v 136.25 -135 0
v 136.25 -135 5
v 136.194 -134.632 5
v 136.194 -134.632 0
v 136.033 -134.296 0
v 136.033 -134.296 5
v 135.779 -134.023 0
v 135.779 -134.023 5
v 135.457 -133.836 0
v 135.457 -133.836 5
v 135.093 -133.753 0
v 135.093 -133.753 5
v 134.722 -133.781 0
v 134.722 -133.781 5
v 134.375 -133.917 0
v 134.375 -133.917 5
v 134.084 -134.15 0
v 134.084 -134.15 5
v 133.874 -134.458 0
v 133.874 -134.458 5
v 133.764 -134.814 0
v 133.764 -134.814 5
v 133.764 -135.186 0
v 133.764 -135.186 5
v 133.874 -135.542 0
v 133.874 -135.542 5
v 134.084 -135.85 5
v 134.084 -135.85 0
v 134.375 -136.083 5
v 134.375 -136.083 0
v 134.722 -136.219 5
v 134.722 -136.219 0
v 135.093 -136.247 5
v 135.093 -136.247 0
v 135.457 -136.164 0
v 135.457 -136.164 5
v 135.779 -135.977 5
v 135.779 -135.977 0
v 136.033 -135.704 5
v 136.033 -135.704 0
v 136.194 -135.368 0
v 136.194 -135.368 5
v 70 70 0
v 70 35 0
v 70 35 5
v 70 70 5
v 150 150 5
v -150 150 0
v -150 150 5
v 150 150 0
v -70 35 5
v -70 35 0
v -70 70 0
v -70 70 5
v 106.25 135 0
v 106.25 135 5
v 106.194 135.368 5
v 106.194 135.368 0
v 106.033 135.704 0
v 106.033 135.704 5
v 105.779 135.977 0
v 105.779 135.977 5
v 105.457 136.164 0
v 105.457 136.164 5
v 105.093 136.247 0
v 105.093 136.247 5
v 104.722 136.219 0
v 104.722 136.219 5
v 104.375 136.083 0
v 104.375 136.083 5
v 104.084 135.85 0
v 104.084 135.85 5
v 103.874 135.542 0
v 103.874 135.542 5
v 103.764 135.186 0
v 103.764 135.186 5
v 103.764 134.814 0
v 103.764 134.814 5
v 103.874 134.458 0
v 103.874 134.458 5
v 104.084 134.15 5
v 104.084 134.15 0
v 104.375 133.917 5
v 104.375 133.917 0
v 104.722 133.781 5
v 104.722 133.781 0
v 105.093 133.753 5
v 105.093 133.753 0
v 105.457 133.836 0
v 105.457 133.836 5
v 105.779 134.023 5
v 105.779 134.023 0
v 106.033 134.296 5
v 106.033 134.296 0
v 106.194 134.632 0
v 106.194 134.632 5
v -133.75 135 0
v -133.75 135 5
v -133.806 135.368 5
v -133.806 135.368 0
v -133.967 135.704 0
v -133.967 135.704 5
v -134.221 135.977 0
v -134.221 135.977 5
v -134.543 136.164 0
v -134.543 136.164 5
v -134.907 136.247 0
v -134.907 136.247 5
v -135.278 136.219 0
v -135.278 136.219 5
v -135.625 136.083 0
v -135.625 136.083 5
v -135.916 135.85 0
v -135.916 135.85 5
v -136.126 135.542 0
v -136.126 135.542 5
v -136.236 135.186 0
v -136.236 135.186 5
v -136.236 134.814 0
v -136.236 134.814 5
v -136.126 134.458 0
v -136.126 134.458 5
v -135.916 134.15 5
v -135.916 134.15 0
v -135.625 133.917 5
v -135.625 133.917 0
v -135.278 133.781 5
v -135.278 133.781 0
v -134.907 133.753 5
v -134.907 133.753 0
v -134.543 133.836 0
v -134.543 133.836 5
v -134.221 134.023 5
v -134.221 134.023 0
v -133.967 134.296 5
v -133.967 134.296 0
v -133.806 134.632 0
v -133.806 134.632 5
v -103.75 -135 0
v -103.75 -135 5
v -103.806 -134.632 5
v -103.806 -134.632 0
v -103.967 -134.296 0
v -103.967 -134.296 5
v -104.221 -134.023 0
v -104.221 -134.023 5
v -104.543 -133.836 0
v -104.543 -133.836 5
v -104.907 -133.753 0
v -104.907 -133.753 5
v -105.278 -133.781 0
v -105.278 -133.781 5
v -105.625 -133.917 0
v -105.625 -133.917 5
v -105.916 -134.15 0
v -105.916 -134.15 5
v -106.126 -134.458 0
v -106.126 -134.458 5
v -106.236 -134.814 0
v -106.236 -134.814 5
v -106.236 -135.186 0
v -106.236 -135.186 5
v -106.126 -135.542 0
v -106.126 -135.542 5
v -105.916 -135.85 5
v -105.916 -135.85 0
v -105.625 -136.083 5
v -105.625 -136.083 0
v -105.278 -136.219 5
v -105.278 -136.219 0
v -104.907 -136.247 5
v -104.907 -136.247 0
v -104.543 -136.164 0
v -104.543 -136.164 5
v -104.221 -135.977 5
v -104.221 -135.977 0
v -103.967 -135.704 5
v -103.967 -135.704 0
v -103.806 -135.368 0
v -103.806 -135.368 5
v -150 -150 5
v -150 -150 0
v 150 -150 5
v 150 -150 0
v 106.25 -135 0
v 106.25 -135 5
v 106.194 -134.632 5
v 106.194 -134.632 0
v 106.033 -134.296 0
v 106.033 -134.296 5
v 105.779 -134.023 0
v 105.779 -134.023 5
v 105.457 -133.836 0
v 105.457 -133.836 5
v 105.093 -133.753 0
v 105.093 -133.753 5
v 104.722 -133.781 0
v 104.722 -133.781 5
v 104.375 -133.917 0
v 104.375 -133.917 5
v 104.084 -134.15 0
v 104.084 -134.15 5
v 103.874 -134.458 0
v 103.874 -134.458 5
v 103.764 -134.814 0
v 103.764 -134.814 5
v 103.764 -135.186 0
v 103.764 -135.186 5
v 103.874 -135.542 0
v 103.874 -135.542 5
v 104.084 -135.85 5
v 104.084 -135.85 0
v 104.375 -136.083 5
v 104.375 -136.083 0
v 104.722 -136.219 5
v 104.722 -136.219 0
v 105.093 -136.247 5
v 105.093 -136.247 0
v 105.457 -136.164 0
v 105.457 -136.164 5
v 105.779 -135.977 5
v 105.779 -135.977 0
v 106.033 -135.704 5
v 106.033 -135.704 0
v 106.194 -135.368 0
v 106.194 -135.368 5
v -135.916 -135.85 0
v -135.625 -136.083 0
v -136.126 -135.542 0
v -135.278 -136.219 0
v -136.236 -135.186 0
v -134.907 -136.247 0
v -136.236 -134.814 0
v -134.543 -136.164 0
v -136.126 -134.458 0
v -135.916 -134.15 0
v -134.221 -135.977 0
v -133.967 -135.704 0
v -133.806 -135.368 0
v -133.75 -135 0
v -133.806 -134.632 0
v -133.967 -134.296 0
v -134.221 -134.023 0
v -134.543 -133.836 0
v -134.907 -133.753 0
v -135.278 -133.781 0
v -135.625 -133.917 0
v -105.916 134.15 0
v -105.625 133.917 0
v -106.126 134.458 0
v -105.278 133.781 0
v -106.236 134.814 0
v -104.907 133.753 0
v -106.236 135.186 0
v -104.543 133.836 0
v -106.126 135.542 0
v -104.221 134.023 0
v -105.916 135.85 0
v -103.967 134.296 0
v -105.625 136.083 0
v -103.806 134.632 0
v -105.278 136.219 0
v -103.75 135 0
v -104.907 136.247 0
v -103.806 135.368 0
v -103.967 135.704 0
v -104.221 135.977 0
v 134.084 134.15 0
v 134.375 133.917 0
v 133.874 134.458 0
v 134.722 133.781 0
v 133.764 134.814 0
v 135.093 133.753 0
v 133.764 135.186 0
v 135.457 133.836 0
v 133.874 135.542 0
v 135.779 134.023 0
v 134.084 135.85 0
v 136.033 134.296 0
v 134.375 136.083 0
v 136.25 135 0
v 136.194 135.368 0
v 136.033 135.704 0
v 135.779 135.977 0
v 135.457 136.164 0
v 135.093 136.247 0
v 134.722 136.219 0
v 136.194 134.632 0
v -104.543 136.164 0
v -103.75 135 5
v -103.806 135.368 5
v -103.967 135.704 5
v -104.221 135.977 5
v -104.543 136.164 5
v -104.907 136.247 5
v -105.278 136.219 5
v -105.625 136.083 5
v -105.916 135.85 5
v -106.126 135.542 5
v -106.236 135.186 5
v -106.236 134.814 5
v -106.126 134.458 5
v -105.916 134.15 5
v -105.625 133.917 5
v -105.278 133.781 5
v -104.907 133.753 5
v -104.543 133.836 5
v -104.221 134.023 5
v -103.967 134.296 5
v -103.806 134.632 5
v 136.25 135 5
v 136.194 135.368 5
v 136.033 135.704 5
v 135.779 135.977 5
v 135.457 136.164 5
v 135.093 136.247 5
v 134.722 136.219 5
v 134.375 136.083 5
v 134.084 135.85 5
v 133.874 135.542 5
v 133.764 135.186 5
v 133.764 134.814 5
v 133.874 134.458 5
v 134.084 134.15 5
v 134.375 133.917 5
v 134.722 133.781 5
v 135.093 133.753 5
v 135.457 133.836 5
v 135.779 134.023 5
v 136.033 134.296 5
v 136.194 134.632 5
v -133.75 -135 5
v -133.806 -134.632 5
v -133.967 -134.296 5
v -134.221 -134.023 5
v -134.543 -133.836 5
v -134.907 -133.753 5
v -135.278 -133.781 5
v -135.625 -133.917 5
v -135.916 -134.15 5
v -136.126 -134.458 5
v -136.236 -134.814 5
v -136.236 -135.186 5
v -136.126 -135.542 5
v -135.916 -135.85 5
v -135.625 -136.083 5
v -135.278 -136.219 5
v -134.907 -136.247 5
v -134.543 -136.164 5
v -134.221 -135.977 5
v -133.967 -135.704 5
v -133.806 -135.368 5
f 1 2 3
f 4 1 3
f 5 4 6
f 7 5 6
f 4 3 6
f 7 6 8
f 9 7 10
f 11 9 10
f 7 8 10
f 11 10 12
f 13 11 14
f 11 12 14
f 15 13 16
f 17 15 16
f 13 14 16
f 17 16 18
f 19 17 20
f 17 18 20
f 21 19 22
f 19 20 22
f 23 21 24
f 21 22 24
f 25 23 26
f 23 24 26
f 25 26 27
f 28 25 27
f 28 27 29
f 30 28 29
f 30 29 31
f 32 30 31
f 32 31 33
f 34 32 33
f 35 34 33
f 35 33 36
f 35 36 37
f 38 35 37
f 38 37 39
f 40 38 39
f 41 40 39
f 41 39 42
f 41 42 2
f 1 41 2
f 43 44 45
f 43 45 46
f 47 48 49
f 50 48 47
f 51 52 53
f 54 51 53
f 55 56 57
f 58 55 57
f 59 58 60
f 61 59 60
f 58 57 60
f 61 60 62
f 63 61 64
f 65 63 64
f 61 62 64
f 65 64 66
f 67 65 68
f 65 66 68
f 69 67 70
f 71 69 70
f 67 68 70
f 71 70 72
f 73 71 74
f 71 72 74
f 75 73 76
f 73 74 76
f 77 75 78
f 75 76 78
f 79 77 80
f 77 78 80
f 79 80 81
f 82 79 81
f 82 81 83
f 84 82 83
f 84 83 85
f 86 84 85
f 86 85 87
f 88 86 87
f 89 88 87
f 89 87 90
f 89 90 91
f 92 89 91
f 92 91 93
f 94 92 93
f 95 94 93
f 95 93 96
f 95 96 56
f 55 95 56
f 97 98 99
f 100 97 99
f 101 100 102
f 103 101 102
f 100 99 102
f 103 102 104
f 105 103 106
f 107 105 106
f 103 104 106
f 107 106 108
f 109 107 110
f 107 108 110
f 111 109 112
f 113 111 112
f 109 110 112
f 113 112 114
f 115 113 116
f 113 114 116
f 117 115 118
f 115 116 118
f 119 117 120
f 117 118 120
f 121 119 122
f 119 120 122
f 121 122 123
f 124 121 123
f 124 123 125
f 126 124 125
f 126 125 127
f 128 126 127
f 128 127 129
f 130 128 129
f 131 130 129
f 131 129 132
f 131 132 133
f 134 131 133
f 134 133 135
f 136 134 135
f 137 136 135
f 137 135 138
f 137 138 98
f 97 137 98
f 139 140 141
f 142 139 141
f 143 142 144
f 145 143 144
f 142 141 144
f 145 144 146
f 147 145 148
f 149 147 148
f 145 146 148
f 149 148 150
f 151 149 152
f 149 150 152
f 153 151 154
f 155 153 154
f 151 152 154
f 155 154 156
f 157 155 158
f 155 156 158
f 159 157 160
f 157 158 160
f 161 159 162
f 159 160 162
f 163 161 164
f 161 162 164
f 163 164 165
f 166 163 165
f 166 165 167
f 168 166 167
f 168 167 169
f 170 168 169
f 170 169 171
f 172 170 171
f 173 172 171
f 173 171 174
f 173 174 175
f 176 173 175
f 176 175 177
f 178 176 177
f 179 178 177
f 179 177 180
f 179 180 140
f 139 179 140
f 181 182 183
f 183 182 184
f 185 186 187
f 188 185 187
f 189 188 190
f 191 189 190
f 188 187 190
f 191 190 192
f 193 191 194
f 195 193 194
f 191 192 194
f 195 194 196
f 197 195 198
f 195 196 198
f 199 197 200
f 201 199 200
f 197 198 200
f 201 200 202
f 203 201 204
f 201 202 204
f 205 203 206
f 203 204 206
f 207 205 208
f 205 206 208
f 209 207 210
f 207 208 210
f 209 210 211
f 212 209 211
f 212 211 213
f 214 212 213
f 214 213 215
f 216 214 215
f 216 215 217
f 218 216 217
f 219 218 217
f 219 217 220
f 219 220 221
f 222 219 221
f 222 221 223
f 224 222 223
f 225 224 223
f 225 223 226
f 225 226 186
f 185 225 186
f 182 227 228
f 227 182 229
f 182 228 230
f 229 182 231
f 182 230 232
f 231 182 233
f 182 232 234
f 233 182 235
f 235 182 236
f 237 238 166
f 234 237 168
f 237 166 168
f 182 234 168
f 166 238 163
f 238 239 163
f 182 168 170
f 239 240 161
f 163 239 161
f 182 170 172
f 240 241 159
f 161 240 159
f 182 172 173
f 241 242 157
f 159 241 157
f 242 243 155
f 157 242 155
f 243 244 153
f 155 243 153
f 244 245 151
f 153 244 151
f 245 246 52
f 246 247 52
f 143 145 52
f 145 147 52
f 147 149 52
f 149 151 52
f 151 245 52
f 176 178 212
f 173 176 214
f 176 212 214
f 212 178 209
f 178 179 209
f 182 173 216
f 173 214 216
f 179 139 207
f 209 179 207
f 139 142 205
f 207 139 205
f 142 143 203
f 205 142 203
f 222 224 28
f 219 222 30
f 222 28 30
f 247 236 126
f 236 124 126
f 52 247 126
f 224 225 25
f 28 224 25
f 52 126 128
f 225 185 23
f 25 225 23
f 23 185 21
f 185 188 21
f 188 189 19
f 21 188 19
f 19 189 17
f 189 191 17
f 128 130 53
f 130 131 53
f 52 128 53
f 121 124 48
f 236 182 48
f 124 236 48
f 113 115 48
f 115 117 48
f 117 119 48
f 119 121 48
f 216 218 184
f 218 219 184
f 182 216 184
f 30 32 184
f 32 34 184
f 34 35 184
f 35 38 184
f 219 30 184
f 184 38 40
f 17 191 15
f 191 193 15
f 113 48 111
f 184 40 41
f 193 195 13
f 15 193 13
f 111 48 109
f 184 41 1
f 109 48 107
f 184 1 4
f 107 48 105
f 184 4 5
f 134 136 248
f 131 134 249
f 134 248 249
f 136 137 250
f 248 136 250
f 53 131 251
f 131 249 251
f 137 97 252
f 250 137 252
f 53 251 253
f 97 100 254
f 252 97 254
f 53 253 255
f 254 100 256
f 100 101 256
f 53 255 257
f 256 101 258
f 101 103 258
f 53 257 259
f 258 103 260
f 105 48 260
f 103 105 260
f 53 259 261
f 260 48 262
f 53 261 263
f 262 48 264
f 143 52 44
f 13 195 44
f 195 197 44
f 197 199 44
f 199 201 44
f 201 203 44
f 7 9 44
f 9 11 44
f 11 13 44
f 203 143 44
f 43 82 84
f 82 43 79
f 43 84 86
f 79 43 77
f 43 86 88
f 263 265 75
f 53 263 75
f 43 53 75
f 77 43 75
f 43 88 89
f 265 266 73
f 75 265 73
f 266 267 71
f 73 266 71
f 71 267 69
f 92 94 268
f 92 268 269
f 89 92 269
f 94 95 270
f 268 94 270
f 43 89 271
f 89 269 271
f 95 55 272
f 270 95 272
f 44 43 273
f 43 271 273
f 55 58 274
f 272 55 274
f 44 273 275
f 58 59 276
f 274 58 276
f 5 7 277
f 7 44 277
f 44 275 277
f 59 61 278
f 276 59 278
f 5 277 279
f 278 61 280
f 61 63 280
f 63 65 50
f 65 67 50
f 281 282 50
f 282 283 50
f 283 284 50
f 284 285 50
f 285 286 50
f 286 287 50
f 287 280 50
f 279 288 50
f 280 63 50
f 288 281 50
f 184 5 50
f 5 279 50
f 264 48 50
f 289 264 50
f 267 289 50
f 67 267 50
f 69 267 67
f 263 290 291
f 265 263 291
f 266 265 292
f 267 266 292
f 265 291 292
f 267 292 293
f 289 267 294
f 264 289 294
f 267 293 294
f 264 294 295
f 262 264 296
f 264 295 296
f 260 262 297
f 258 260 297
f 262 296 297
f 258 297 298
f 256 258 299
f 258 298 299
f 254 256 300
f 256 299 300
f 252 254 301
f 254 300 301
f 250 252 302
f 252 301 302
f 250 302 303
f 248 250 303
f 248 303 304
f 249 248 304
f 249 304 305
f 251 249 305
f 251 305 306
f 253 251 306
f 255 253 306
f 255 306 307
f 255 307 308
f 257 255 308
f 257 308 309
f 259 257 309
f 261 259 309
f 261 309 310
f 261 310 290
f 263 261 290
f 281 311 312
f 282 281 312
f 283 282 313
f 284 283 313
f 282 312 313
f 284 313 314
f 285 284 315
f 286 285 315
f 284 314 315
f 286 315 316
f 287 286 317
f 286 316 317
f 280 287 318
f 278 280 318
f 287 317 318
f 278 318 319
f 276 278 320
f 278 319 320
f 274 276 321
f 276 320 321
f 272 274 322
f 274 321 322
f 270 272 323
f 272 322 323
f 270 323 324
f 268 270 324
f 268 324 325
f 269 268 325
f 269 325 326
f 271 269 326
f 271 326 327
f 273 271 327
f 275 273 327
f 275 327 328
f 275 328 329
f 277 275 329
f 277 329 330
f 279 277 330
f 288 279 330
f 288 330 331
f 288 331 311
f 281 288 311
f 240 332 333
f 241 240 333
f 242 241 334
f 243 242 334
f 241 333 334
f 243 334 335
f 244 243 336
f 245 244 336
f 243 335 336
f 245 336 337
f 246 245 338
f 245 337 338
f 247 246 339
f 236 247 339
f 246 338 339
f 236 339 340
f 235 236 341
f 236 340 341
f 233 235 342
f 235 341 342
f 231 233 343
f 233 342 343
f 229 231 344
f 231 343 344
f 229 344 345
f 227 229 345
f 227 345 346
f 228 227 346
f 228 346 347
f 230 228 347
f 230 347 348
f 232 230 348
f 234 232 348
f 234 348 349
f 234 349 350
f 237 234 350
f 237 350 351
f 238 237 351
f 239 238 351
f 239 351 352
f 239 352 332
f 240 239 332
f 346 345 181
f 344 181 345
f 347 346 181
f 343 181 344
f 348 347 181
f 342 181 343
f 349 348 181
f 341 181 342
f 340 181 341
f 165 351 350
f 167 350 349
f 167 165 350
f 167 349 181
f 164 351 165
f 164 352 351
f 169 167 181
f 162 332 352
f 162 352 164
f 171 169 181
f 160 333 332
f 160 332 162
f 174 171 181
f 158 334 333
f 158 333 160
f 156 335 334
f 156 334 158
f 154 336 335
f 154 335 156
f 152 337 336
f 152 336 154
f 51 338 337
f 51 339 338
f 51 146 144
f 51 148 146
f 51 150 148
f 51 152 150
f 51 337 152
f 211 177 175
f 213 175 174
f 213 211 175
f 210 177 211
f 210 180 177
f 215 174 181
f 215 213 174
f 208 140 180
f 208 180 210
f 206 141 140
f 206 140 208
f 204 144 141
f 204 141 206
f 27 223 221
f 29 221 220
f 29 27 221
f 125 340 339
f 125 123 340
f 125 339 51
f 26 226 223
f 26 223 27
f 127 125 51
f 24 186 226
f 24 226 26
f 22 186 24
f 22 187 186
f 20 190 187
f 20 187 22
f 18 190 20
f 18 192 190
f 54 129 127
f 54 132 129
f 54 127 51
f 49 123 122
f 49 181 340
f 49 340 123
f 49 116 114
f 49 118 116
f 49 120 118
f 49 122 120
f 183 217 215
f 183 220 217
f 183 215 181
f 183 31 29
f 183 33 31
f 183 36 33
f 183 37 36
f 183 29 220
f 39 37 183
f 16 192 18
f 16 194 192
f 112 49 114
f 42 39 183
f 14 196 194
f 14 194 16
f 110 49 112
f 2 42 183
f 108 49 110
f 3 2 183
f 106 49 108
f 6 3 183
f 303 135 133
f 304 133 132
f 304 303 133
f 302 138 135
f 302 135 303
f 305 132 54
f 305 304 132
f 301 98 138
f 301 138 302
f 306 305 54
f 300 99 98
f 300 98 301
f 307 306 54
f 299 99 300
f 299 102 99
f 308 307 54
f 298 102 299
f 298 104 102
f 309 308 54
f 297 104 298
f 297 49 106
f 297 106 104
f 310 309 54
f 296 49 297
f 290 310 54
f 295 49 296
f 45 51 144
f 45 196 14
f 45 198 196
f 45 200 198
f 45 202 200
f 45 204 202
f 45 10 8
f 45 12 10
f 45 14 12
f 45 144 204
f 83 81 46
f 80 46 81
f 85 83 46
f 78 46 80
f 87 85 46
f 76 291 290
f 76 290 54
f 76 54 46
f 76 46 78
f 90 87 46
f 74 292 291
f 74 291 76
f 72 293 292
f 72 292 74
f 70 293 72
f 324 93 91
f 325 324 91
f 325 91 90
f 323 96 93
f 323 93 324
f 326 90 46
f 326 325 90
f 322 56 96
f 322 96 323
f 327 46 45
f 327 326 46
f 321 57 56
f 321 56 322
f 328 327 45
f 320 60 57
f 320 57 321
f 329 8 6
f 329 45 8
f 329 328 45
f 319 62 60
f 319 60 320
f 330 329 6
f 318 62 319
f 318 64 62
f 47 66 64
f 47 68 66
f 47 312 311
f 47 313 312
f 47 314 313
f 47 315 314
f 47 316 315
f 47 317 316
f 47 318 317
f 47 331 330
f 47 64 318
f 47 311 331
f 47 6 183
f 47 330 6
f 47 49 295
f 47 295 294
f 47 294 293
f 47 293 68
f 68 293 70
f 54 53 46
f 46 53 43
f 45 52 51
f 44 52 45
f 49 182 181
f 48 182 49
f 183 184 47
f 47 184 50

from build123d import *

# Parameters (mm, degrees)
F0_W     = 300
F0_H     = 300
F0_W_2   = 140
F0_H_2   = 35
F1_DEPTH = 5
F2_R     = 1.25
F3_DEPTH = 5.001


with BuildPart() as f1:
    # F0 (on Top) → F1 (new body)
    with BuildSketch(Plane.XY):
        Rectangle(F0_W, F0_H)
        with Locations((0, 52.5)):
            Rectangle(F0_W_2, F0_H_2, mode=Mode.SUBTRACT)
    extrude(amount=F1_DEPTH)

    # F2 (on face) → F3 (cut, through all)
    with BuildSketch(Plane.XY.offset(5)):
        with Locations((-135, 135)):
            Circle(F2_R)
        with Locations((135, 135)):
            Circle(F2_R)
        with Locations((-135, -135)):
            Circle(F2_R)
        with Locations((135, -135)):
            Circle(F2_R)
        with Locations((-105, -135)):
            Circle(F2_R)
        with Locations((105, -135)):
            Circle(F2_R)
        with Locations((105, 135)):
            Circle(F2_R)
        with Locations((-105, 135)):
            Circle(F2_R)
    extrude(amount=-F3_DEPTH, mode=Mode.SUBTRACT)


solid = f1.part
